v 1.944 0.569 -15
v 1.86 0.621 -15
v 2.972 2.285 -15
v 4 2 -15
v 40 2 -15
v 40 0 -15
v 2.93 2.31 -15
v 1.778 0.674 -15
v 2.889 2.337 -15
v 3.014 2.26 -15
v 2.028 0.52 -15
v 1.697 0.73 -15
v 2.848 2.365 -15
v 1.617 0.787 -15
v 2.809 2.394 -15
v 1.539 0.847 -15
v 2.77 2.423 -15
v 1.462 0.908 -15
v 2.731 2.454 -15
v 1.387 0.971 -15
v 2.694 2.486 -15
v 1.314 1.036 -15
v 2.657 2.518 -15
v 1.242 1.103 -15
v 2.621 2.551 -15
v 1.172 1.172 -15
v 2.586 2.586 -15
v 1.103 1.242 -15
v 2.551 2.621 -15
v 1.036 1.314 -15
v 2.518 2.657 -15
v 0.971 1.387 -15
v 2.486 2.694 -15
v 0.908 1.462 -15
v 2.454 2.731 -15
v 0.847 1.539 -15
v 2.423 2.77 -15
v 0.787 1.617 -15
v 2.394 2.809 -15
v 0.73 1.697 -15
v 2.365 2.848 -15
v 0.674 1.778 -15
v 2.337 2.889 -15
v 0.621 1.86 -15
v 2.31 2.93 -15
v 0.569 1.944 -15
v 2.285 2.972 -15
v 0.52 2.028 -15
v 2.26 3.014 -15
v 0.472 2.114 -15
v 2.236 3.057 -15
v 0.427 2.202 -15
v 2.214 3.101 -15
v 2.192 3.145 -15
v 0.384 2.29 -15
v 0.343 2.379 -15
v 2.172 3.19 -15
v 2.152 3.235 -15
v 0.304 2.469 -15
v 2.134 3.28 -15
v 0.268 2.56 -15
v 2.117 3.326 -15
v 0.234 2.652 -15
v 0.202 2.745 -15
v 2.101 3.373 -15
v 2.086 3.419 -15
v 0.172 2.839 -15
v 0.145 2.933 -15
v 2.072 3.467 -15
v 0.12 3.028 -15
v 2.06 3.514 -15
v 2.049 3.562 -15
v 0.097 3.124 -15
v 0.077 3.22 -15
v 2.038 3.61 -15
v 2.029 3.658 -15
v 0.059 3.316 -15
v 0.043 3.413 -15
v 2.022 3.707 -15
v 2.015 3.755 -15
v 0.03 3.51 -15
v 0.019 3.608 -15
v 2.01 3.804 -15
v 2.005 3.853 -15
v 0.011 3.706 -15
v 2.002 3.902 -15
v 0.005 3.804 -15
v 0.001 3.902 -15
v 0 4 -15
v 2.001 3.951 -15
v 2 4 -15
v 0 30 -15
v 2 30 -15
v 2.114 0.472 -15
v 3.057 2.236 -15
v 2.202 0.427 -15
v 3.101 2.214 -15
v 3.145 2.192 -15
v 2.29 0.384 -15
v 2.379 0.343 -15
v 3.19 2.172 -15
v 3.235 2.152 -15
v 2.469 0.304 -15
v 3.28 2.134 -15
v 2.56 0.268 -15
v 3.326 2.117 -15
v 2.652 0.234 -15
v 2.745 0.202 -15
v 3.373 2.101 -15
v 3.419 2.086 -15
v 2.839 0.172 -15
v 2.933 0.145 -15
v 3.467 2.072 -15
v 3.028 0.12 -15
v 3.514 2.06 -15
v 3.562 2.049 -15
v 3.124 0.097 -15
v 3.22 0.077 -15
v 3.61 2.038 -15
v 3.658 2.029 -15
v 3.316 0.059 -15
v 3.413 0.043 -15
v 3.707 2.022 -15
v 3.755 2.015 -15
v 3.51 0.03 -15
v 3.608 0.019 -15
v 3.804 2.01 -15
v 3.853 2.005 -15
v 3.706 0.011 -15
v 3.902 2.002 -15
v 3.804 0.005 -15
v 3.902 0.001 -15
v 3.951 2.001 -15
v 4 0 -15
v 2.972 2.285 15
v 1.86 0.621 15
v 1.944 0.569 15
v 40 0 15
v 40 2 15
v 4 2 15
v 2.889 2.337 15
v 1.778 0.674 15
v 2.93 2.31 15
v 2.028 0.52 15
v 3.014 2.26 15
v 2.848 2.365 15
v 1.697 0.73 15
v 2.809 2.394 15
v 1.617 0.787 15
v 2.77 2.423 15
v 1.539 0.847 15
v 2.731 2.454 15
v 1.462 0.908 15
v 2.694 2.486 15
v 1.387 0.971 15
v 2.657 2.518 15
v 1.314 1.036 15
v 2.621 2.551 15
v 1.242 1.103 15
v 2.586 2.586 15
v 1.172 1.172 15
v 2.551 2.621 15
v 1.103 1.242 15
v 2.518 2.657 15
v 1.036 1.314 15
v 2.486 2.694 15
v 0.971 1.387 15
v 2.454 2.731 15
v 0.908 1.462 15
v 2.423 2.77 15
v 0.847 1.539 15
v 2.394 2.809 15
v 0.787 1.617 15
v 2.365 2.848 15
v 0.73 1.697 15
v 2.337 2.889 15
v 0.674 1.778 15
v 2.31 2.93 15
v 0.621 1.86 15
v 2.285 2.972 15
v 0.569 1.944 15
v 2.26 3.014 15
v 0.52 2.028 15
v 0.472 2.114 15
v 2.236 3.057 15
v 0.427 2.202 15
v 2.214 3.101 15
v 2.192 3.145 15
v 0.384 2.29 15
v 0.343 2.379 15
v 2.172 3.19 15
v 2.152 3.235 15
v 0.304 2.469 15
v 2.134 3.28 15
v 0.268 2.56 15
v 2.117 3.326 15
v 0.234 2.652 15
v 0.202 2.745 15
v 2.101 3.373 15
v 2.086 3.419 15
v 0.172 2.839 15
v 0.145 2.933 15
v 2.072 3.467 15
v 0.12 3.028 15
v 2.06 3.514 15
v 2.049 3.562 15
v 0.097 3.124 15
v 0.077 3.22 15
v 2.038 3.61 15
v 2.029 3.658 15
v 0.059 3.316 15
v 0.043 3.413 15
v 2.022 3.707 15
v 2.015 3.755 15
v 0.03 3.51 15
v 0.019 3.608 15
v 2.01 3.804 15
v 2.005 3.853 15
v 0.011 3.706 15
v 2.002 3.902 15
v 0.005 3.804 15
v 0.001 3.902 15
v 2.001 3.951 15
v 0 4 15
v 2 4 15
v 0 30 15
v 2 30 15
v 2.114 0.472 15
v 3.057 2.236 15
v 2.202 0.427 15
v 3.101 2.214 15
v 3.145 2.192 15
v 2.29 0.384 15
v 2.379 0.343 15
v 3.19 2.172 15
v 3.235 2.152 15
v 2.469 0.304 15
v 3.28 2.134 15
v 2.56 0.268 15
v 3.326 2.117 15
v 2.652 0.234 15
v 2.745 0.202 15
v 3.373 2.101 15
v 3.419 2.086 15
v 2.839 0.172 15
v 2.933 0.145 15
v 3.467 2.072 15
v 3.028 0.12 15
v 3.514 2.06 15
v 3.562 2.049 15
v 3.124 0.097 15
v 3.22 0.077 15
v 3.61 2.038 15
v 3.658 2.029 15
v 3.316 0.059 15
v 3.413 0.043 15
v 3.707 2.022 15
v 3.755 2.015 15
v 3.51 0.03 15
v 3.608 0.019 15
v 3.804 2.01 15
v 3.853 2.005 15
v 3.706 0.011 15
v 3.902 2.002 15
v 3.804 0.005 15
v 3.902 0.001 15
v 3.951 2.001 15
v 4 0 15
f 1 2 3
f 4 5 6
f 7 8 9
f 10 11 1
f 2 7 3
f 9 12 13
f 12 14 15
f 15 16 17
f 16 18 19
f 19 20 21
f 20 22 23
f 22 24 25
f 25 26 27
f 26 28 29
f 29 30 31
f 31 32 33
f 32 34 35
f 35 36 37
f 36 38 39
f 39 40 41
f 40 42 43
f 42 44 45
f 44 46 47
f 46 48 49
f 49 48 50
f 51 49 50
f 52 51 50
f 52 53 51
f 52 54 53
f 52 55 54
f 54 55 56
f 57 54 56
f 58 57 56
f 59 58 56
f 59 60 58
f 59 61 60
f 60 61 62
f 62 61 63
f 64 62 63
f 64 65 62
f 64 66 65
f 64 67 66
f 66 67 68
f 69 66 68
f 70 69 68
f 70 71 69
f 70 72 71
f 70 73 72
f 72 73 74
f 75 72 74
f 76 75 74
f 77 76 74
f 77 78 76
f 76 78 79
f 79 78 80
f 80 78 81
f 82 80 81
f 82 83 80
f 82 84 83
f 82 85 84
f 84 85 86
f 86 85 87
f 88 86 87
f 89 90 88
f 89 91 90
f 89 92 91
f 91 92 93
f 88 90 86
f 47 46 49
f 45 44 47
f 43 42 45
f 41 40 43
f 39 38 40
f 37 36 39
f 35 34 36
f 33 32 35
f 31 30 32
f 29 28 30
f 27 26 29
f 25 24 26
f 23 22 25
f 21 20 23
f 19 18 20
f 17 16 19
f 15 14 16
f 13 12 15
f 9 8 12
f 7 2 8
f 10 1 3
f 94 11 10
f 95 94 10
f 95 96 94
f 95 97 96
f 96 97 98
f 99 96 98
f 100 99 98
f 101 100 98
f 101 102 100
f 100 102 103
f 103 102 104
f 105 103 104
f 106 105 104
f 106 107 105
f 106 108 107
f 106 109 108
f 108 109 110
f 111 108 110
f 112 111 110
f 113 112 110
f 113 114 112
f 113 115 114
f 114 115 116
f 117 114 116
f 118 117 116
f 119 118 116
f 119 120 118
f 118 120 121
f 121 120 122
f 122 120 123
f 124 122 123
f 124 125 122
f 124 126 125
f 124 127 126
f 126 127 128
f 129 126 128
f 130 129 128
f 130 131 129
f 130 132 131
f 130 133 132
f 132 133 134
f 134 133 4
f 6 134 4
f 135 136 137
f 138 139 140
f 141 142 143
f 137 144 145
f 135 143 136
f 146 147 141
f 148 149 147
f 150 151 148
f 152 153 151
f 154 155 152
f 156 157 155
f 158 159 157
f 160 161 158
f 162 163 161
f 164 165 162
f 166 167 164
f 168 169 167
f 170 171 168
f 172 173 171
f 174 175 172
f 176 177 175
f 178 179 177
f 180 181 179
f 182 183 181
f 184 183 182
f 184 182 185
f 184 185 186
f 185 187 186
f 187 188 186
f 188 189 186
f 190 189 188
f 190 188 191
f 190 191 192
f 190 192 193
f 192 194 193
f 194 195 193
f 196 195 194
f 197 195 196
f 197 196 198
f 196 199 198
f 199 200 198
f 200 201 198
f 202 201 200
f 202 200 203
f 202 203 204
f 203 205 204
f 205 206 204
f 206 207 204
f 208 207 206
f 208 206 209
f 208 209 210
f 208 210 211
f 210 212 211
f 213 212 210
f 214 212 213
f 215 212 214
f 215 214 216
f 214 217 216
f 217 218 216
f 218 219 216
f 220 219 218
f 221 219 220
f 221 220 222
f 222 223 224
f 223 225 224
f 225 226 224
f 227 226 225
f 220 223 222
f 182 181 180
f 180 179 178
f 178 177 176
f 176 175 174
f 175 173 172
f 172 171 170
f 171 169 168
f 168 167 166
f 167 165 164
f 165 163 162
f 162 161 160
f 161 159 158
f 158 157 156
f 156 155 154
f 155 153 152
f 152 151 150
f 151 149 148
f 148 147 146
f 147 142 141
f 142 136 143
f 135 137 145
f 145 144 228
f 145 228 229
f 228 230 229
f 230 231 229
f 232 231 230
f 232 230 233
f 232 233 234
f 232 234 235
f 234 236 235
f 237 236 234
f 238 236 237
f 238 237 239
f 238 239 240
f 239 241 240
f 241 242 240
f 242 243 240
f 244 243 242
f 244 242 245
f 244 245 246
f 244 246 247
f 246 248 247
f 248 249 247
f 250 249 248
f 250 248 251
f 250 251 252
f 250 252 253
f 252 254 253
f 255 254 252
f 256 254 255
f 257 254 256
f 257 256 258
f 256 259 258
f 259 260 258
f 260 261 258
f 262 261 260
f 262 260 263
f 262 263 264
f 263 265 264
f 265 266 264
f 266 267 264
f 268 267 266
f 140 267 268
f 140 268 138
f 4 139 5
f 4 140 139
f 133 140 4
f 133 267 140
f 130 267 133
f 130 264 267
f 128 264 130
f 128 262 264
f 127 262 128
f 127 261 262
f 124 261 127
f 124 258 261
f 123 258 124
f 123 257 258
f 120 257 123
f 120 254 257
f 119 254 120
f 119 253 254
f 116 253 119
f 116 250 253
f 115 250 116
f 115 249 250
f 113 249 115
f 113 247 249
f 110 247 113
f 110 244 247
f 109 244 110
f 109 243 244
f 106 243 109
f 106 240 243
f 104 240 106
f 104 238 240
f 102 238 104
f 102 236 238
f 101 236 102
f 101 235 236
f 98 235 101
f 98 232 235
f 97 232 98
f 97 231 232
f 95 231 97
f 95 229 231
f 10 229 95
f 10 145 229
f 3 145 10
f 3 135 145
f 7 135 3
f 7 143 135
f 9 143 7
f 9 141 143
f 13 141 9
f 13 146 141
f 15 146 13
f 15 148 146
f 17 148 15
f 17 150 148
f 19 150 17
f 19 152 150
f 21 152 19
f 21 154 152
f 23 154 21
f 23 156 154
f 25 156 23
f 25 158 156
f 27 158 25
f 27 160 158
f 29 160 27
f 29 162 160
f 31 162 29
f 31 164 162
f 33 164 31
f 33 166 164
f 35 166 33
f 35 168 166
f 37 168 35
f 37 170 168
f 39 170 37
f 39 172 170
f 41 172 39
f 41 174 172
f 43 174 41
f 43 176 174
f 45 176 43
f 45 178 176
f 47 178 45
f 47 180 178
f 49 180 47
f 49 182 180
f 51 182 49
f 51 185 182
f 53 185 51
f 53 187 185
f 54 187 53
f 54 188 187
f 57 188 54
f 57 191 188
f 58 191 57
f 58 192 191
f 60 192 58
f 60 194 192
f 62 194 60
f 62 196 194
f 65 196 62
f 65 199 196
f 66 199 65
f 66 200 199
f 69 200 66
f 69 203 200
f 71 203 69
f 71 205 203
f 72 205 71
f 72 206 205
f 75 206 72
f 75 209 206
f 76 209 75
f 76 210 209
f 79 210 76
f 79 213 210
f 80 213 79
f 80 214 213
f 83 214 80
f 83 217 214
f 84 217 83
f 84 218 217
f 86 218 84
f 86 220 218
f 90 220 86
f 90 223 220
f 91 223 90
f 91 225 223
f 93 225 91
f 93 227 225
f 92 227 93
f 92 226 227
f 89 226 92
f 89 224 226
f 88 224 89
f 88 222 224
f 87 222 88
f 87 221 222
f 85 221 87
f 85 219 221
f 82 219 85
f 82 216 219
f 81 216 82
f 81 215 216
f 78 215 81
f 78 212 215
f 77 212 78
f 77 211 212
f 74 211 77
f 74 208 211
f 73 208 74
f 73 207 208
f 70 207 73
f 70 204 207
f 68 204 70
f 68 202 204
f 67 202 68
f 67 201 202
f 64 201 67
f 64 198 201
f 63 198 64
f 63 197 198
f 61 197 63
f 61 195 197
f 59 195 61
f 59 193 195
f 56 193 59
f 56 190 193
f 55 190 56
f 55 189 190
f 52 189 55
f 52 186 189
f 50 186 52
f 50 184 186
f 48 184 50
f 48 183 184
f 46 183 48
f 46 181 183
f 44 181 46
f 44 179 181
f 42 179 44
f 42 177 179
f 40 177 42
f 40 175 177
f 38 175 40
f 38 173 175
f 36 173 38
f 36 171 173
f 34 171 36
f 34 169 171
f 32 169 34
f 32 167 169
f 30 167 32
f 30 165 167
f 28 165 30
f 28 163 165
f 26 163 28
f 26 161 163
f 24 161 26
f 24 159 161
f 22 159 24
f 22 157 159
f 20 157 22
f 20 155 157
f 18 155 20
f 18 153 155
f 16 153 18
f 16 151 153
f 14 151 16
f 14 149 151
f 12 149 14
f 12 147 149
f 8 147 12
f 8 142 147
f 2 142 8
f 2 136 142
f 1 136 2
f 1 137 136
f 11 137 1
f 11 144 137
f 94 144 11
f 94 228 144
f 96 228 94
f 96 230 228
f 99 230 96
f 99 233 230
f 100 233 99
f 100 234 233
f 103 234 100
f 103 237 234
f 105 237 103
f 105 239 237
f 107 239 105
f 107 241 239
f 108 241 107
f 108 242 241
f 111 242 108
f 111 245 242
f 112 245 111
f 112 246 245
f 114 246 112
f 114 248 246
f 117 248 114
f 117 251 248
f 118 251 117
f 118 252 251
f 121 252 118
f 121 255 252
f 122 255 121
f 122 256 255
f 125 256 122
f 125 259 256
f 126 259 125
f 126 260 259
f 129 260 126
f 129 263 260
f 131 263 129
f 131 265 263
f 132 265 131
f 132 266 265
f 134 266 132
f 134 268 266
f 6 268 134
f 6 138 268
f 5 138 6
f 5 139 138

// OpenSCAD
// Sheet metal L-bracket with a 90-degree bend
// Design Parameters
thickness = 2.0;       // Sheet metal thickness (mm)
inside_radius = 2.0;   // Inside bend radius (mm)
flange1_outside = 40.0;// Outside length of flange 1 (mm)
flange2_outside = 30.0;// Outside length of flange 2 (mm)
width = 30.0;          // Bracket width (mm)
k_factor = 0.45;       // K-factor for bend allowance calculation

// PI constant definition for compatibility
PI = 3.141592653589793;

// Flat-pattern calculations
outside_radius = inside_radius + thickness;
f1_straight = flange1_outside - outside_radius; // Straight segment of flange 1
f2_straight = flange2_outside - outside_radius; // Straight segment of flange 2
bend_angle = 90;

// Bend Allowance (BA) formula
bend_allowance = (bend_angle * PI / 180) * (inside_radius + k_factor * thickness);
flat_length = f1_straight + f2_straight + bend_allowance;

// Output the manifest line to the console
echo(str("MAKERBENCH-SHEETMETAL: {\"thickness_mm\": ", thickness, ", \"bend_radius_mm\": ", inside_radius, ", \"flat_length_mm\": ", flat_length, "}"));

// 2D Profile Generation
steps = 64; // High resolution for smooth arcs

outside_arc_points = [
    for (i = [0 : steps]) 
        [
            outside_radius + outside_radius * cos(270 - i * (90 / steps)), 
            outside_radius + outside_radius * sin(270 - i * (90 / steps))
        ]
];

inside_arc_points = [
    for (i = [0 : steps]) 
        [
            outside_radius + inside_radius * cos(180 + i * (90 / steps)), 
            outside_radius + inside_radius * sin(180 + i * (90 / steps))
        ]
];

profile_points = concat(
    [[flange1_outside, 0]],
    outside_arc_points,
    [[0, flange2_outside], [thickness, flange2_outside]],
    inside_arc_points,
    [[flange1_outside, thickness]]
);

// 3D Solid Generation
linear_extrude(height = width, center = true, convexity = 10) {
    polygon(profile_points);
}
